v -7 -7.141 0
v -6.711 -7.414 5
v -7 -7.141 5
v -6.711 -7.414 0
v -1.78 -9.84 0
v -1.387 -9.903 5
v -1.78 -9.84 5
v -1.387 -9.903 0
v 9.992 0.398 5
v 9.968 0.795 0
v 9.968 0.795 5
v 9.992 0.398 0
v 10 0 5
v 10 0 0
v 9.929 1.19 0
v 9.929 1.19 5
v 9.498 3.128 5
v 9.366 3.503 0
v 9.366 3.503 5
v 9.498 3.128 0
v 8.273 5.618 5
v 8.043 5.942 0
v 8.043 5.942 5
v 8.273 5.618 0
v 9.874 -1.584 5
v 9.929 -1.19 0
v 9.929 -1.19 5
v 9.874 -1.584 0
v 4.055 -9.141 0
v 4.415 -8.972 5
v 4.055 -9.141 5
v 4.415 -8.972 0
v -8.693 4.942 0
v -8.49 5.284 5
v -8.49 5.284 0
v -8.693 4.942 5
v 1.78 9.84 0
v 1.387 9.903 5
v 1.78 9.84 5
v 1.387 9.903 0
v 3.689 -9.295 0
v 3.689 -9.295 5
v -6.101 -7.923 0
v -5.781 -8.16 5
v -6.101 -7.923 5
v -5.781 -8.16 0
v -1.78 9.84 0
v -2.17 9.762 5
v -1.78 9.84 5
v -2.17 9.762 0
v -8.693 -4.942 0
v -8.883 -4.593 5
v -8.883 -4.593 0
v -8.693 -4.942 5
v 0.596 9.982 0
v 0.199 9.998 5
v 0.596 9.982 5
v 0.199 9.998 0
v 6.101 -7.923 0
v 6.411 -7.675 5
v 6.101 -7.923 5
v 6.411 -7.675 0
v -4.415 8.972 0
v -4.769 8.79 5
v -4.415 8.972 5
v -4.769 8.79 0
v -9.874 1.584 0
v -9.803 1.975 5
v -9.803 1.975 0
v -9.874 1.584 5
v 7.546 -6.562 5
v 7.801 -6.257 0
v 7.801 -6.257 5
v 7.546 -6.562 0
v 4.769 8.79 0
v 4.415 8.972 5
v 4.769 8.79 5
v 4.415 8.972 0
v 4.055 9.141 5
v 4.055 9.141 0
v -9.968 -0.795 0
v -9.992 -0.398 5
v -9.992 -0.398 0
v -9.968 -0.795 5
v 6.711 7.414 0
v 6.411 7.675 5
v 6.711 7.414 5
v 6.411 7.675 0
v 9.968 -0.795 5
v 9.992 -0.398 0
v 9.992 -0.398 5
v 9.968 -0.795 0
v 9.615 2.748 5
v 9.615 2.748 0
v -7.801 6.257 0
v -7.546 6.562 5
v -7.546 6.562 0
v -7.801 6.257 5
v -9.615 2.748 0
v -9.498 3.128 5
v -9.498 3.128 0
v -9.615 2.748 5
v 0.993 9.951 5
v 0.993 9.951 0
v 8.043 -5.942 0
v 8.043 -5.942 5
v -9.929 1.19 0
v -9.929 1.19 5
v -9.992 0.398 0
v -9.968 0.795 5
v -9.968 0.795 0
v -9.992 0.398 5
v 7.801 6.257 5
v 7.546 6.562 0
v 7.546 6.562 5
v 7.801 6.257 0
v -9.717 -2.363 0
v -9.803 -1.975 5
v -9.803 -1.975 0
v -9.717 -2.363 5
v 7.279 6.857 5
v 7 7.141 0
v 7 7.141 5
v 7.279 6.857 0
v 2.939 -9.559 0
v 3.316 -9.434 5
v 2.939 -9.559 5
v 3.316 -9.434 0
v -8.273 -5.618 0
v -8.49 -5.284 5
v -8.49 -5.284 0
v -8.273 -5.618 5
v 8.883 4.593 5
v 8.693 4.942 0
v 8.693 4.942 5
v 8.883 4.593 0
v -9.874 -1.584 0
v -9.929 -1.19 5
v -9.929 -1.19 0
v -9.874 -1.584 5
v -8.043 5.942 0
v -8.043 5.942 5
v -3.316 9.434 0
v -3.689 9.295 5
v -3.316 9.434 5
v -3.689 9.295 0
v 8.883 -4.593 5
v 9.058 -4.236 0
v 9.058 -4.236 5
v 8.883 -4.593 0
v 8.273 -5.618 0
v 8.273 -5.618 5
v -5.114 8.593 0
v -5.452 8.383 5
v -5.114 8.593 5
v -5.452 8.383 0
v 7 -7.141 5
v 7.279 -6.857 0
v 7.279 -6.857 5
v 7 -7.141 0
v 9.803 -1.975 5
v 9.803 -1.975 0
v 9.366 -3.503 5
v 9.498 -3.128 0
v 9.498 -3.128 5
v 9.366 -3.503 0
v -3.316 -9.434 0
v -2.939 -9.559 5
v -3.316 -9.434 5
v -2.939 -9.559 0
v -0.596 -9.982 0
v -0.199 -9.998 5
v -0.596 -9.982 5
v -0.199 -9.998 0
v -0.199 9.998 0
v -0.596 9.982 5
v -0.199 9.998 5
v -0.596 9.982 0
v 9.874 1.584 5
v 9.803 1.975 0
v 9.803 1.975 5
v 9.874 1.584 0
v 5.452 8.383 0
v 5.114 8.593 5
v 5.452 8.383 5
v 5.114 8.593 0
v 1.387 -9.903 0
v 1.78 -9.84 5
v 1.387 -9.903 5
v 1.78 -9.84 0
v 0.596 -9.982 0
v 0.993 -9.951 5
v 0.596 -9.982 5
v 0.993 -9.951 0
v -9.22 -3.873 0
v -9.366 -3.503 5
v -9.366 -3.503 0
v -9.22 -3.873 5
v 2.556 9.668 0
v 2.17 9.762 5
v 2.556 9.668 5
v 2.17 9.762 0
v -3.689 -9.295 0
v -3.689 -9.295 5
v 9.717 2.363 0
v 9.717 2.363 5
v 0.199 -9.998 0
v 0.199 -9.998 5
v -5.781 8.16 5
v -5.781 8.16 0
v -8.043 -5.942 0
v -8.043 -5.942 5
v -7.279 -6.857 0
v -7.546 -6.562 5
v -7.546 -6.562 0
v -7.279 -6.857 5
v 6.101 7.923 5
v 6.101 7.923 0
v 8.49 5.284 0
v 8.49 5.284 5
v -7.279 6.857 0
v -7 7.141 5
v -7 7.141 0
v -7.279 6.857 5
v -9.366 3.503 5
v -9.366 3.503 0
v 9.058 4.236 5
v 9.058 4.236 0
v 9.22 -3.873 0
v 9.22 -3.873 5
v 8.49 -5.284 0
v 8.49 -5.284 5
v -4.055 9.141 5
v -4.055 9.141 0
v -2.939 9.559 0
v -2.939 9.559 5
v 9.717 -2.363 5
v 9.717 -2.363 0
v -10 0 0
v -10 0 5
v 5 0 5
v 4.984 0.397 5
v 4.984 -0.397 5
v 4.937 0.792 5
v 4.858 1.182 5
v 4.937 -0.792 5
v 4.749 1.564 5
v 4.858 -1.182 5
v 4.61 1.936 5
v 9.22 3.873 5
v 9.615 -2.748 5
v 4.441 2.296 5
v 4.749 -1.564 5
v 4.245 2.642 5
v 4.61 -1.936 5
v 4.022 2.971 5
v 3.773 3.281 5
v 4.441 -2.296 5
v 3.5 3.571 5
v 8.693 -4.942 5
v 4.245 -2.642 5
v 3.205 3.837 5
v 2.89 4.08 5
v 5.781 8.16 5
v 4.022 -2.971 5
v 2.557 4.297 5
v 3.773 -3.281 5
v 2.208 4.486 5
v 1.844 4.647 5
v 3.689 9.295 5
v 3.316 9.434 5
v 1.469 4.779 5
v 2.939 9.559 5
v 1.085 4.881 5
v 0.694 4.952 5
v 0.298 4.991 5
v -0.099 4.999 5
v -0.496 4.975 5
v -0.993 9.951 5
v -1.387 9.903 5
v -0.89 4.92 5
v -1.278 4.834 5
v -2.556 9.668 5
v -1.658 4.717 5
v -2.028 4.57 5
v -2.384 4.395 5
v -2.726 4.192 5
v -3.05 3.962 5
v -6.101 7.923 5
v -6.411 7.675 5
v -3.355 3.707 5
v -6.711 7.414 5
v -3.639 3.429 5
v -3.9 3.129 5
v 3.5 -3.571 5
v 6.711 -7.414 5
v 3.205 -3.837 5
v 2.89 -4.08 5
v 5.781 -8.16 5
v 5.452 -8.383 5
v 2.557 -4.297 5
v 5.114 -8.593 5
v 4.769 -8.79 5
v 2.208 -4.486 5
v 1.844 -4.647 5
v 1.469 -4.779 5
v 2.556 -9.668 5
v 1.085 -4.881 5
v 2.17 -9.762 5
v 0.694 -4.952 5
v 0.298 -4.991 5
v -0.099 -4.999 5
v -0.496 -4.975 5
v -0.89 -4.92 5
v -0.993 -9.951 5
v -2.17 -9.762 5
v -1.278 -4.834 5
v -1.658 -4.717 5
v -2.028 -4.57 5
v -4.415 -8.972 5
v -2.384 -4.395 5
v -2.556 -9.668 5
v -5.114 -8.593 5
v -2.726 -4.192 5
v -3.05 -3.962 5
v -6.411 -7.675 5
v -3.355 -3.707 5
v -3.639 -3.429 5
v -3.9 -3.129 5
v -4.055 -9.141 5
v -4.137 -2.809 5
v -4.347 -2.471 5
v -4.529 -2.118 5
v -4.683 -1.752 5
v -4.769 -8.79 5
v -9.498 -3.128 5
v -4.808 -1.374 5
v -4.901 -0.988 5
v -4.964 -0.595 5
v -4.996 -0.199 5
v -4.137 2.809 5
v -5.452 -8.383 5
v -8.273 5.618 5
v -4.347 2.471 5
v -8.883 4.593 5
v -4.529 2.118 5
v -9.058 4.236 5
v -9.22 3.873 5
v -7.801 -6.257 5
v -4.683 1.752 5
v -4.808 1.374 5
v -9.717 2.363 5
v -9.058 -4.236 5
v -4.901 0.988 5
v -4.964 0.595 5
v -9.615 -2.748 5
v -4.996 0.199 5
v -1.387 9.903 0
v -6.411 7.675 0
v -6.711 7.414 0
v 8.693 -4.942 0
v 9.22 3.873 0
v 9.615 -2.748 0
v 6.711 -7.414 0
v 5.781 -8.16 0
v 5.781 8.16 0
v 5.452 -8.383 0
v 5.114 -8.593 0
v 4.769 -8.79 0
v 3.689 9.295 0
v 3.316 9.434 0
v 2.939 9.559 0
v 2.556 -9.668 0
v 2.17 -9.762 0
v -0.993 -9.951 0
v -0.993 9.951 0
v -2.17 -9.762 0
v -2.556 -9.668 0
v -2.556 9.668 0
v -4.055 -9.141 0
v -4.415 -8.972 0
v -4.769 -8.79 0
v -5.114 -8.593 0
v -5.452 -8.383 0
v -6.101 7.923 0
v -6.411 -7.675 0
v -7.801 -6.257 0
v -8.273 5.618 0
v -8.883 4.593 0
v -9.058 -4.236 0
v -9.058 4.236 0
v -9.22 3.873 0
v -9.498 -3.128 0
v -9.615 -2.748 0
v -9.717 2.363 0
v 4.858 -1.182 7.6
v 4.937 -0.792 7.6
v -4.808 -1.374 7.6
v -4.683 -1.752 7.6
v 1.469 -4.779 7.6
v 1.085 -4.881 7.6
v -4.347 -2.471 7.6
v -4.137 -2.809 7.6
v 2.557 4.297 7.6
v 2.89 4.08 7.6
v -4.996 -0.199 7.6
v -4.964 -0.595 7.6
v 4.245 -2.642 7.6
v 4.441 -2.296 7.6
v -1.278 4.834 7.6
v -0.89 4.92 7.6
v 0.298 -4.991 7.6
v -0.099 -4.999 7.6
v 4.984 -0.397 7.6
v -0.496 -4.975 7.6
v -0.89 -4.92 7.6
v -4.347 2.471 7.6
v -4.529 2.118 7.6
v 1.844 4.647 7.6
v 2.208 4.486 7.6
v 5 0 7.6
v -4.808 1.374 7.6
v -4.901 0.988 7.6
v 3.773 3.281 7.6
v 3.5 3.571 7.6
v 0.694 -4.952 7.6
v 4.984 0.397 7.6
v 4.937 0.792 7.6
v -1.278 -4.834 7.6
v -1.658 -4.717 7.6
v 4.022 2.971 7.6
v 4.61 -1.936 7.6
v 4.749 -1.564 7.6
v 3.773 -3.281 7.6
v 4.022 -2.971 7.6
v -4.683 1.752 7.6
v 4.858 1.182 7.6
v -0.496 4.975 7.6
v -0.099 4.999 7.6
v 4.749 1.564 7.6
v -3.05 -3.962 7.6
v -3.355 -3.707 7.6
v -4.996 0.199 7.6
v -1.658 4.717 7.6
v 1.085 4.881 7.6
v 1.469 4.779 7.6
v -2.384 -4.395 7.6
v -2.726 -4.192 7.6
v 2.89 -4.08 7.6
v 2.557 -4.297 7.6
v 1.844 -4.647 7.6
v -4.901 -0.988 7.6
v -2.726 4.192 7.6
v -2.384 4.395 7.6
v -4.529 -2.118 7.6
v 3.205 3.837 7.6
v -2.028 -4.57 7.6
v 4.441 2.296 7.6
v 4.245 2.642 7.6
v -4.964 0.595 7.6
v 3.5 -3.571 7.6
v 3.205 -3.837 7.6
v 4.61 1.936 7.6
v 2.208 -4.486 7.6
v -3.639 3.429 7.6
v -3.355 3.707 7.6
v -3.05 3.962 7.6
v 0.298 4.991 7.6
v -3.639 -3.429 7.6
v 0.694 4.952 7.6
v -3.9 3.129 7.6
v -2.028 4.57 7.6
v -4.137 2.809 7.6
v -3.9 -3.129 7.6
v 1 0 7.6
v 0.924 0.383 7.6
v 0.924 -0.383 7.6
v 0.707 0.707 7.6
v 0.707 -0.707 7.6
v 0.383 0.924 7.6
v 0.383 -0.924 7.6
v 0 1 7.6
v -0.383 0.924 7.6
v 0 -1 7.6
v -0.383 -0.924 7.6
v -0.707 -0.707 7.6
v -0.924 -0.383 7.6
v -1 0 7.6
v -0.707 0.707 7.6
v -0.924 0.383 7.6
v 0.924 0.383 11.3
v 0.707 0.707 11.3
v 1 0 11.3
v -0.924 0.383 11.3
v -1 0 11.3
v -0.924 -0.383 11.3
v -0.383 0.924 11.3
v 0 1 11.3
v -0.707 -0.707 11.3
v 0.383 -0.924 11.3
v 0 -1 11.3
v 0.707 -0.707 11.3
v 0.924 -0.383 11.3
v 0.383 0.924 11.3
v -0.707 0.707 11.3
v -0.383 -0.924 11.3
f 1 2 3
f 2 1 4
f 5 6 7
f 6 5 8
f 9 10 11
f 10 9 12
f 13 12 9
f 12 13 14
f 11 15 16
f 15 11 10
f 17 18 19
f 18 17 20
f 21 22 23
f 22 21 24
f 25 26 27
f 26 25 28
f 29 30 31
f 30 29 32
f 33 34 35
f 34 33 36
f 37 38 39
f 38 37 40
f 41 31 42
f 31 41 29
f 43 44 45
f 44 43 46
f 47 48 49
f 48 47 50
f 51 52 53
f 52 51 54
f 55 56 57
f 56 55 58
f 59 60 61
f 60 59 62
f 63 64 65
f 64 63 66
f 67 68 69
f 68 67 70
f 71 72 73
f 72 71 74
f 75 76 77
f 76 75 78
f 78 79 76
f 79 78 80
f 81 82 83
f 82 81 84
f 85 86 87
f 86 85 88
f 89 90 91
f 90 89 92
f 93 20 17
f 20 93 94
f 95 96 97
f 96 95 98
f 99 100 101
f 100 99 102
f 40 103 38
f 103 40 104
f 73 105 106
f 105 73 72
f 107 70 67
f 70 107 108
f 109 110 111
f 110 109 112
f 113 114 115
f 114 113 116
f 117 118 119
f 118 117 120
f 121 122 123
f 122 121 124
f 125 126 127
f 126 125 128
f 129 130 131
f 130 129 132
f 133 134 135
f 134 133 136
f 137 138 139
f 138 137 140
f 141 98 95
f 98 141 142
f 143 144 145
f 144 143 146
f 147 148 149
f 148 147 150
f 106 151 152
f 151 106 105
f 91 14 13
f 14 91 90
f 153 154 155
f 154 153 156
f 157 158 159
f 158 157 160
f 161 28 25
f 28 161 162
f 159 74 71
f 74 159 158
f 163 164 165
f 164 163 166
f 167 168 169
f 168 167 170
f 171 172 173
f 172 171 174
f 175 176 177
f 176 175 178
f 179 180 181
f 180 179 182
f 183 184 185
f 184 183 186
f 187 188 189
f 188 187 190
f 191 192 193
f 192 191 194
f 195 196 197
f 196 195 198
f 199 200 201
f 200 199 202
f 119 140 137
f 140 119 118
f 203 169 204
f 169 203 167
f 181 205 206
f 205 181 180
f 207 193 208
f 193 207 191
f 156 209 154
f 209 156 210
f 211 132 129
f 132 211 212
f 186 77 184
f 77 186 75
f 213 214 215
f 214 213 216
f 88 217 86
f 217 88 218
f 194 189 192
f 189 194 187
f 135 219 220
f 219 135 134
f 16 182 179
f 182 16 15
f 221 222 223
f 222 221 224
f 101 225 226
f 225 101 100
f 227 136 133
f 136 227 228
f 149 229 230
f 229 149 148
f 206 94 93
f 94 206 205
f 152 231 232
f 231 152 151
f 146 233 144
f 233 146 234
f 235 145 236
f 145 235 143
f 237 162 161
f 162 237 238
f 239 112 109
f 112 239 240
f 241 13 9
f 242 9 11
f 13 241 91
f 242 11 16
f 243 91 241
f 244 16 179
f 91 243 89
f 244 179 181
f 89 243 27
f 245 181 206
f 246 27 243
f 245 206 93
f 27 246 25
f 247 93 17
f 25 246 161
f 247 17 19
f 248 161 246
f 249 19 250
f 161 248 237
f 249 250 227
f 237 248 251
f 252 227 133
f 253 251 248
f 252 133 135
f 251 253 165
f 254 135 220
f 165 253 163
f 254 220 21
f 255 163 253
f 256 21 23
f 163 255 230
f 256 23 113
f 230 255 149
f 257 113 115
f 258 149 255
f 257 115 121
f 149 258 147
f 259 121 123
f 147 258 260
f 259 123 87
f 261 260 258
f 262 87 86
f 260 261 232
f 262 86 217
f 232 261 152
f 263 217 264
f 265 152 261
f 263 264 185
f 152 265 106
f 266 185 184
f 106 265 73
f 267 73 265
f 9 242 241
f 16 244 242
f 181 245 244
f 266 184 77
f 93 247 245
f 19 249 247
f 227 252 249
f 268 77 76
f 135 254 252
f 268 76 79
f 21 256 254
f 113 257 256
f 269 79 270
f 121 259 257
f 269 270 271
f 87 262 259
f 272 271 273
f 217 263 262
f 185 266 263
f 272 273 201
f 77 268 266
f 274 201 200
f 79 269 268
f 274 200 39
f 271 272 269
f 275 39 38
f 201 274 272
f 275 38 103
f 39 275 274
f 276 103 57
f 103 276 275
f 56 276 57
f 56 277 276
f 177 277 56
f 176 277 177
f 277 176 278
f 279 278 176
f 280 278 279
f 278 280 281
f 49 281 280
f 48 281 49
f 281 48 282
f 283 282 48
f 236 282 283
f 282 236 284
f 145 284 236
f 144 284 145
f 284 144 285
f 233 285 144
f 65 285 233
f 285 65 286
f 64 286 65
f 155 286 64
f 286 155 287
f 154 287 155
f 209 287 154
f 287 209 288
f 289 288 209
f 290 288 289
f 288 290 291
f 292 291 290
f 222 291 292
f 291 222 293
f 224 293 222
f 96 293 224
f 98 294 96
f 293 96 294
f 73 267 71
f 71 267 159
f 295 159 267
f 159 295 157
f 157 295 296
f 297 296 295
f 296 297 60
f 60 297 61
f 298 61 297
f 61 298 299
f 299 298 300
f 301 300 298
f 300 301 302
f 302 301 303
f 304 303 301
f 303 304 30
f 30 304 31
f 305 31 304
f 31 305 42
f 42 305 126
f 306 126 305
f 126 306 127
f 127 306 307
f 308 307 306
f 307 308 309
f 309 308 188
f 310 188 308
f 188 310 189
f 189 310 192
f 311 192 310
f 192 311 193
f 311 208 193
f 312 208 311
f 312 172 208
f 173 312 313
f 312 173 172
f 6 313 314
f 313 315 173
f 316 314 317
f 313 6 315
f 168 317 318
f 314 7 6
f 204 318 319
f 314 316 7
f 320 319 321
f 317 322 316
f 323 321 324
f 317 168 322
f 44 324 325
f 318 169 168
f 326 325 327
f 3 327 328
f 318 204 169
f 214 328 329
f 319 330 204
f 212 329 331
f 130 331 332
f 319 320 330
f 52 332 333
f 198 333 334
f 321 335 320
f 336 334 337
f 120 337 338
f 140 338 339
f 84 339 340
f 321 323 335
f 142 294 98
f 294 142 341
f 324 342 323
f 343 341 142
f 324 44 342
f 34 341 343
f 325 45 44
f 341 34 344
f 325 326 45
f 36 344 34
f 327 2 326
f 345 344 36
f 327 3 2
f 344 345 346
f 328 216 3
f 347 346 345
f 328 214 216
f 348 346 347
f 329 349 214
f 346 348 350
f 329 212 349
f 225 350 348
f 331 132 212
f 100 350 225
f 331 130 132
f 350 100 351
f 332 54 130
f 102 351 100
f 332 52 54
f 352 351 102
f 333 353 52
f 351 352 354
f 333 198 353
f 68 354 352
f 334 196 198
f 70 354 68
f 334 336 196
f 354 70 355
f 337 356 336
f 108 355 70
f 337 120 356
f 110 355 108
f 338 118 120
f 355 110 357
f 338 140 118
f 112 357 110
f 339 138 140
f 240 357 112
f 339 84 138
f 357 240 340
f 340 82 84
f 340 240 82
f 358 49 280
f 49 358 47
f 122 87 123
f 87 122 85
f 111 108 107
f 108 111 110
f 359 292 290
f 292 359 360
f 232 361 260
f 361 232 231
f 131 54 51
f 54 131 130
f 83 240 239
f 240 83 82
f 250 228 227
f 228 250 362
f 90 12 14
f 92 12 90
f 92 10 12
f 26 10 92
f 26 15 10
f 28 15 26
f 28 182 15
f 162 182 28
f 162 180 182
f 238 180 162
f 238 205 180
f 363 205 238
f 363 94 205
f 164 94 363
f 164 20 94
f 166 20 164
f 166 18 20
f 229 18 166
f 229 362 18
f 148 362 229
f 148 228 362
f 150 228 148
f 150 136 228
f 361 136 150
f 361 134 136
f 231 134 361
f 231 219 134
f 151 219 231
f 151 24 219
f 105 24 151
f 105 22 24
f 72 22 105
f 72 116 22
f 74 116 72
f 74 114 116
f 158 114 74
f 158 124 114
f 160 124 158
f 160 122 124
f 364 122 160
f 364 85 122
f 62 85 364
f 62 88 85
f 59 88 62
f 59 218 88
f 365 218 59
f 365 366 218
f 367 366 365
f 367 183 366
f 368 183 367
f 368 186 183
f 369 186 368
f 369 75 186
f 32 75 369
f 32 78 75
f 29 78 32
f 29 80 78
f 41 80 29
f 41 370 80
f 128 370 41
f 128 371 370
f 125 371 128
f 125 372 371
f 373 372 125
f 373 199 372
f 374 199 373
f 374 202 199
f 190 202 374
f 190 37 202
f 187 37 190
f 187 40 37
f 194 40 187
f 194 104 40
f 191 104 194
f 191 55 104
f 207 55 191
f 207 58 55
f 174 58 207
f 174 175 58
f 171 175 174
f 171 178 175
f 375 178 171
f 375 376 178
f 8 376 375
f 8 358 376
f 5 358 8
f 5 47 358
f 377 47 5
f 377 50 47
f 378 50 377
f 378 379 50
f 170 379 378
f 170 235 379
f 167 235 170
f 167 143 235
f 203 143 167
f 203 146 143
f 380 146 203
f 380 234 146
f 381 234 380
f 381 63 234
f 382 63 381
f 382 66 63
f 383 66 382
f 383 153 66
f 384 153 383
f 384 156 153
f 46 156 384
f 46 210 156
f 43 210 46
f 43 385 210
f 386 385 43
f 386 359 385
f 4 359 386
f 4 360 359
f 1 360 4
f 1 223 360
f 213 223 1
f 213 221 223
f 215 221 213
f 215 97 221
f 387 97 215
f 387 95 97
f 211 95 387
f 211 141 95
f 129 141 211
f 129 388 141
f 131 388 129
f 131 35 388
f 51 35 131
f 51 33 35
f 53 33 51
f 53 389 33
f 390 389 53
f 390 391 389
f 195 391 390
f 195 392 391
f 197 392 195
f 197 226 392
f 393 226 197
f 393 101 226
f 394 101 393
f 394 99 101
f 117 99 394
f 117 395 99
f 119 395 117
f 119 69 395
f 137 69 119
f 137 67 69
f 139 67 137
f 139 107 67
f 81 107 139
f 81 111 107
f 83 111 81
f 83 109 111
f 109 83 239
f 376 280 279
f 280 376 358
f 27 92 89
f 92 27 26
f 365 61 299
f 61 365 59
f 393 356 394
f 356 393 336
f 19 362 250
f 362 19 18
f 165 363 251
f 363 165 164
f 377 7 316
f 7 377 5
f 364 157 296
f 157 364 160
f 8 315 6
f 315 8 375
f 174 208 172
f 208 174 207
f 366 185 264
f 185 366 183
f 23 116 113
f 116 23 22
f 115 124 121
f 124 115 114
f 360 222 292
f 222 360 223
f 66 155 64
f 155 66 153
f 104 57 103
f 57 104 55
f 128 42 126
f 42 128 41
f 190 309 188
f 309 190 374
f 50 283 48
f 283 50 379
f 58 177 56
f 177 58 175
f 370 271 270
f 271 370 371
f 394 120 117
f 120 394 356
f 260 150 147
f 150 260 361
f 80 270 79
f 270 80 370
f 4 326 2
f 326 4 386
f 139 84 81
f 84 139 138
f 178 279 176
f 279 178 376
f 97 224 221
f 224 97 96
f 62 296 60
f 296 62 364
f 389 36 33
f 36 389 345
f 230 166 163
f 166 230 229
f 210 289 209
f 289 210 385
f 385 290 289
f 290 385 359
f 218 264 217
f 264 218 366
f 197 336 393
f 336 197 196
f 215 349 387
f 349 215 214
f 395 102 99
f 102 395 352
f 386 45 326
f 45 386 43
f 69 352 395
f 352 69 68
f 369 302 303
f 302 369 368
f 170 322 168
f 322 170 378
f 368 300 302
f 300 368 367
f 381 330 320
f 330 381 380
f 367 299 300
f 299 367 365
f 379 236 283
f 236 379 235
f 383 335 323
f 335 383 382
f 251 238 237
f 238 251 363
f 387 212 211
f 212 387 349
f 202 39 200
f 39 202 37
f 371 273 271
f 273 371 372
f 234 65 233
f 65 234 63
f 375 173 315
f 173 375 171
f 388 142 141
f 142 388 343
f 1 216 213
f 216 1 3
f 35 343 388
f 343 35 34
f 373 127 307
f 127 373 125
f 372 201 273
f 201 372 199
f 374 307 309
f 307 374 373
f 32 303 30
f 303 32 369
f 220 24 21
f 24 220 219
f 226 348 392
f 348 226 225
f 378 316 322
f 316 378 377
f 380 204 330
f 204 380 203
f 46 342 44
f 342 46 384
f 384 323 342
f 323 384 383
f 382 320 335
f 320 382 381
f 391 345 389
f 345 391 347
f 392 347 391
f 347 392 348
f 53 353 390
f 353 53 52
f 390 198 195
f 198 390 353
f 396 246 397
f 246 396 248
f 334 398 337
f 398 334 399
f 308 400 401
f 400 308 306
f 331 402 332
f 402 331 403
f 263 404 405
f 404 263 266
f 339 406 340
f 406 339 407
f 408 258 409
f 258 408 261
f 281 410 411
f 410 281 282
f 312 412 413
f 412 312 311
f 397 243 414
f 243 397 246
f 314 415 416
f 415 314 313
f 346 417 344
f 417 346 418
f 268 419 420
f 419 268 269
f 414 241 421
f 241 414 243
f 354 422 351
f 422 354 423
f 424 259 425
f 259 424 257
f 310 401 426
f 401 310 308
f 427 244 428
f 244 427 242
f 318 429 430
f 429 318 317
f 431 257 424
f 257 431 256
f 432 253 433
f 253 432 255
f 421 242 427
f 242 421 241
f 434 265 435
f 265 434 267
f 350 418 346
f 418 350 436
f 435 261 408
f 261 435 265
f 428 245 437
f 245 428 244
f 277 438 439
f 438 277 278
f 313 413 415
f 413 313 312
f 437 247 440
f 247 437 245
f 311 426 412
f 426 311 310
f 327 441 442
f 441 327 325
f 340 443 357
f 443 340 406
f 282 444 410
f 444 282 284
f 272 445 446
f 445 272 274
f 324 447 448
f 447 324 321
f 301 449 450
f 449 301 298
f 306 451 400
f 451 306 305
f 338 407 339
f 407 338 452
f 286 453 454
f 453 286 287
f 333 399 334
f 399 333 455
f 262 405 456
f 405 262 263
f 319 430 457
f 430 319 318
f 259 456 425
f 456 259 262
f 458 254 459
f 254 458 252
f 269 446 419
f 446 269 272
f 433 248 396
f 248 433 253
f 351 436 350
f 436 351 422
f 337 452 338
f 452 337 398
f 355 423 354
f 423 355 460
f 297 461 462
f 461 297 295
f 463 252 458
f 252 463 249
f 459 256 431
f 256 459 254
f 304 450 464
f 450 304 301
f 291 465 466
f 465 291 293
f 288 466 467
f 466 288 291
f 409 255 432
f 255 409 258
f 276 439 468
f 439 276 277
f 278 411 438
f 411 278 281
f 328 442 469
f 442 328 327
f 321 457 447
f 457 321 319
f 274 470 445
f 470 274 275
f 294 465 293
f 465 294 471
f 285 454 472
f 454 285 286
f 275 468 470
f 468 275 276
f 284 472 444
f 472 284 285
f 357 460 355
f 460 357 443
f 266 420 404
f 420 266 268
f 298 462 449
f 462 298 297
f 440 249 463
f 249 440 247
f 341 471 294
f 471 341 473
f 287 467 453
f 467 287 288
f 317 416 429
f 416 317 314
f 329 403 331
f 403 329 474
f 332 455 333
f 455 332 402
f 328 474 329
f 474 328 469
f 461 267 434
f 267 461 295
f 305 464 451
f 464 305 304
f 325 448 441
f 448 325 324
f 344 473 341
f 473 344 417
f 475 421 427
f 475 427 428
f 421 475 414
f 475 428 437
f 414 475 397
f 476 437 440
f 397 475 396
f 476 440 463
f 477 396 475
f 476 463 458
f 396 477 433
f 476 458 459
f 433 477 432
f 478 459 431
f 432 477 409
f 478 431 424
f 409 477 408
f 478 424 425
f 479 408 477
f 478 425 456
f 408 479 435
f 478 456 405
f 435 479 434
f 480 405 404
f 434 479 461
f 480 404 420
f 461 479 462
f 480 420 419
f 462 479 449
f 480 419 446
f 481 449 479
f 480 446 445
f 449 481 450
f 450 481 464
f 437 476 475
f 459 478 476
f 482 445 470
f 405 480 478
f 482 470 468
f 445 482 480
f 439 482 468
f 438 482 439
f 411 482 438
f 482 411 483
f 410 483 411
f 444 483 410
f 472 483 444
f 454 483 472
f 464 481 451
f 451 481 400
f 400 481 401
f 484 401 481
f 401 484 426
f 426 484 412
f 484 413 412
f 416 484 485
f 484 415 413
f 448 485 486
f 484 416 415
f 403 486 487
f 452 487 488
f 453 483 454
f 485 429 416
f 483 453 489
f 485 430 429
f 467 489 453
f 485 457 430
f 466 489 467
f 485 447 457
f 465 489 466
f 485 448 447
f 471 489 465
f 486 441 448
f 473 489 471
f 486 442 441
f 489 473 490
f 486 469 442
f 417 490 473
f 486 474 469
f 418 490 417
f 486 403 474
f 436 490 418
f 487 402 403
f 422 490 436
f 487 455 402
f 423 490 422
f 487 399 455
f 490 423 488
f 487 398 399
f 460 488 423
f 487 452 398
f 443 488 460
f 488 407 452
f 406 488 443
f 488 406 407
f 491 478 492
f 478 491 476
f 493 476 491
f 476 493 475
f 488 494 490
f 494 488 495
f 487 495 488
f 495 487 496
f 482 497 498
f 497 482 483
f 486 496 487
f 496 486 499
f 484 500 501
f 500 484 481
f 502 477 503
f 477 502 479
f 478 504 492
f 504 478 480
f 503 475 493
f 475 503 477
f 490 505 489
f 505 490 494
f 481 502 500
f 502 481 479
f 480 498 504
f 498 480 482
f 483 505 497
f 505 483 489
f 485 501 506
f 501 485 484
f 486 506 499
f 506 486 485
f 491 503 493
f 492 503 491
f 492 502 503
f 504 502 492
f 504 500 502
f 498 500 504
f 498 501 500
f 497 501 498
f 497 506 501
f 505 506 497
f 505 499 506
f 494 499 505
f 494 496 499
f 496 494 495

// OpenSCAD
/* [Boiler Plate] */

$fa = 1;
$fs = 0.4;
eps = 0.001;

infinity = 50;
 

/* [Test v_cylinder initial] */
show_initial_test_vci = true;

h_vci = [5, 2.6, 3.7];
r_vci = [10, 5, 1];
colors_vci = ["red", "yellow", "blue"];

/* [Test v_conic_frustrum] */
show_v_conic_frustrum_test_vcf = false;
test_data_columns_vcf = false;
show_v_conic_frustrum_test_data_columns_dc = false; 
colors_for_test_vcf = ["red", "blue", "green", "yellow"];
/* [Hidden] */
color_red_idx_vcf = 0;
color_blue_idx_vcf = 1;
color_green_idx_vcf = 2;
color_yellow_idx_vcf = 3;

/* [Test sample_pin] */
show_test_pin_tsp = false;

r_top_tsp = 5.11; 
r_top_inner_tsp = 4.11; 
r_neck_tsp = 3.65; 
r_base_inner_tsp = 5.11; 
r_base_tsp = 5.11;
h_total_tsp = 10.11; 
h_top_tsp = 2.11; 
h_base_tsp = 2.11;

/* [Test sample pin air gap ] */
show_test_sample_pin_air_gap_spag = false;

air_gap_spag = 0; // [0:0.1:5] 
test_piece_radius_by_rbase_spag = 2; // [0.9:0.1:5]
test_piece_handle_length_spag = 5; // [0:0.1:50]
red_spag = 128; // [10:255]
blue_spag = 128; // [10:255]
green_spag = 128; // [10:255]
alpha_spag = 0.5; // [0:0.1:1]


module hide_from_customizer(){}


// Cumulative sum of values in v
function cumsum(v) = [for (a = v[0]-v[0], i = 0; i < len(v); a = a+v[i], i = i+1) a+v[i]];
    
function vector_sum(v, i=0, r=0) = i<len(v) ? vector_sum(v, i+1, r+v[i]) : r;

function index_of(columns, idx_to_match, i=0) = 
    i == len(columns) ?
        undef :
        columns[i]==idx_to_match ? 
            i : 
            index_of(columns, idx_to_match, i + 1);


module v_cylinder(r, h, colors) {
    count = len(h);
    h_cum = cumsum(h);
    echo("h_cum", h_cum);
    for(i = [0 : count-1]) {
        h_i = h[i];
        echo("h_i", h_i);
        dz = i == 0 ? 0.0 :  h_cum[i-1];
        translate([0,0,dz]) 
        color(colors[i]) cylinder(r=r[i], h=h[i]);
    }
}

// Use functions to export constants
function vcf_r1_idx() = 0;
function vcf_r2_idx() = 1;
function vcf_h_idx() = 2;
function vcf_color_idx() = 3;

module v_conic_frustrum(data_columns, data, colors) {
    
    r1_idx = index_of(data_columns, vcf_r1_idx());
    r2_idx = index_of(data_columns, vcf_r2_idx());
    color_idx = index_of(data_columns, vcf_color_idx());
    h_idx = index_of(data_columns, vcf_h_idx());
    
    count = len(data);
    if (count == 0) {
        echo("###################### Warning:  Data is empty in v_conic_frustrum");
    } else {
        h = [for (i = [0 : count-1]) data[i][h_idx] ];
        h_cum = cumsum(h);
        r1 = [for (i = [0 : count-1]) data[i][r1_idx]];
        r2 = [for (i = [0 : count-1]) data[i][r2_idx]];
        color_offset = [for (i = [0 : count-1]) data[i][color_idx]];
        for(i = [0 : count-1]) {
            h_i = h[i];
            // Make object slightly oversized for intersection goodness,
            // and nice previews 
            dz = (i == 0 ? 0.0 :  h_cum[i-1]) -eps ; 
            translate([0,0,dz]) 
            color(colors[color_offset[i]]) 
            cylinder(r1=r1[i], r2=r2[i], h=h[i] + 2 * eps);
        }  
    }  
}

if (show_initial_test_vci) {
    length = len(h_vci);
    list_2 = [ for (i = [0 : 1 : length-1]) i < 2 ? h_vci[i] : 0 ];
    echo("list_2", list_2);
    
    sum = vector_sum(h_vci);
    echo("vector_sum", sum, h_vci);
    echo("cumsum", h_vci, cumsum(h_vci));
    v_cylinder(r=r_vci, h=h_vci, colors=colors_vci);
}


if (show_v_conic_frustrum_test_vcf) {
    columns = [vcf_r1_idx, vcf_r2_idx, vcf_h_idx, vcf_color_idx];
    conic_frustrum_test_data = [
        [4, 5, 3.3, color_blue_idx_vcf],
        [5, 2, 5.3, color_red_idx_vcf],
        [2, 2, 3.1, color_green_idx_vcf],
        [2, 2, 3.1, color_red_idx_vcf],
    ];
    
    echo("conic_frustrum_test_data", conic_frustrum_test_data);
    element_0 = conic_frustrum_test_data[0];
    echo("element_0", element_0);
    h0 = element_0[2];
    echo("h0", h0);
    v_conic_frustrum(columns, conic_frustrum_test_data, colors_for_test_vcf);
}


if (show_v_conic_frustrum_test_data_columns_dc) {
    
    data_columns_changed = [vcf_color_idx, vcf_r1_idx, vcf_r2_idx, vcf_h_idx];
    conic_frustrum_test_data_changed_column_ordering = [
        [color_blue_idx_vcf,  4, 5, 3.3],
        [color_red_idx_vcf,   5, 2, 5.3],
        [color_green_idx_vcf, 2, 2, 3.1],
        [color_red_idx_vcf,   2, 2, 3.1],
    ];
    map = [1, 2, 3, 0];
    count = 4;
    echo("color idx", map[vcf_color_idx]);
    echo("r1 idx", map[vcf_r1_idx]);
    echo("r2 idx", map[vcf_r2_idx]);
    echo("h idx", map[vcf_h_idx]);
    echo("data_column", data_columns_changed);
    echo("map", map);
    echo("vcf_h_idx", vcf_h_idx);
    
    map_trial = [
        index_of(data_columns_changed, 0),
        index_of(data_columns_changed, 1), 
        index_of(data_columns_changed, 2), 
        index_of(data_columns_changed, 3)]; 
    echo("map_trial", map_trial);
    assert(is_undef(index_of(data_columns_changed, 99)));
    
    v_conic_frustrum(
        data_columns_changed, 
        conic_frustrum_test_data_changed_column_ordering, 
        colors_for_test_vcf);
    
}


module sample_pin(r_top, r_top_inner, r_neck, r_base_inner, r_base, h_total, h_top, h_base, air_gap=0) {
    
    // air_gap provides an ability to scale up the pin, to allow using intersection 
    // to generate a cavity for the pin.  Should help with print in place
    assert(!is_undef(r_top), "You must specify r_top");
    assert(!is_undef(r_top_inner), "You must specify r_top_inner");
    assert(!is_undef(r_neck), "You must specify r_neck");
    assert(!is_undef(r_base_inner), "You must specify r_base_inner");
    assert(!is_undef(r_base), "You must specify r_base");
    assert(!is_undef(h_total), "You must specify h_total");
    assert(!is_undef(h_top), "You must specify h_top");
    assert(!is_undef(h_base), "You must specify h_base");
    
    assert(air_gap >= 0, "air_gap must >= zero");
    
    function ag(r) = r + air_gap;
    
    columns = [vcf_r1_idx(), vcf_r2_idx(), vcf_h_idx(), vcf_color_idx()];
    h_neck = h_total - h_top - h_base;
    h_neck_bottom = h_neck/2;
    h_neck_top = h_neck/2;
    data = [
        [ag(r_base),        ag(r_base),         h_base,         color_blue_idx_vcf],
        [ag(r_base_inner),  ag(r_neck),         h_neck_bottom,  color_red_idx_vcf],
        [ag(r_neck),        ag(r_top_inner),    h_neck_top,     color_green_idx_vcf],
        [ag(r_top),         ag(r_top),          h_top,          color_yellow_idx_vcf],
    ];    
    v_conic_frustrum(
        columns, 
        data, 
        colors_for_test_vcf);
}


if (show_test_pin_tsp) {
    sample_pin(r_top_tsp, r_top_inner_tsp, r_neck_tsp, r_base_inner_tsp, r_base_tsp, h_total_tsp, h_top_tsp, h_base_tsp);
}


if (show_test_sample_pin_air_gap_spag) {
    sample_pin(
        r_top_tsp, r_top_inner_tsp, r_neck_tsp, r_base_inner_tsp, 
        r_base_tsp, h_total_tsp, h_top_tsp, h_base_tsp);

    test_piece_size = r_base_tsp*test_piece_radius_by_rbase_spag;
    color([red_spag/255, green_spag /255, blue_spag/255], alpha=alpha_spag) {
        difference() {
            cylinder(h=h_total_tsp, r=test_piece_size);
            sample_pin(
                r_top_tsp, r_top_inner_tsp, r_neck_tsp, r_base_inner_tsp, 
                r_base_tsp, h_total_tsp, h_top_tsp, h_base_tsp, air_gap=air_gap_spag);     
        }
    }
}
